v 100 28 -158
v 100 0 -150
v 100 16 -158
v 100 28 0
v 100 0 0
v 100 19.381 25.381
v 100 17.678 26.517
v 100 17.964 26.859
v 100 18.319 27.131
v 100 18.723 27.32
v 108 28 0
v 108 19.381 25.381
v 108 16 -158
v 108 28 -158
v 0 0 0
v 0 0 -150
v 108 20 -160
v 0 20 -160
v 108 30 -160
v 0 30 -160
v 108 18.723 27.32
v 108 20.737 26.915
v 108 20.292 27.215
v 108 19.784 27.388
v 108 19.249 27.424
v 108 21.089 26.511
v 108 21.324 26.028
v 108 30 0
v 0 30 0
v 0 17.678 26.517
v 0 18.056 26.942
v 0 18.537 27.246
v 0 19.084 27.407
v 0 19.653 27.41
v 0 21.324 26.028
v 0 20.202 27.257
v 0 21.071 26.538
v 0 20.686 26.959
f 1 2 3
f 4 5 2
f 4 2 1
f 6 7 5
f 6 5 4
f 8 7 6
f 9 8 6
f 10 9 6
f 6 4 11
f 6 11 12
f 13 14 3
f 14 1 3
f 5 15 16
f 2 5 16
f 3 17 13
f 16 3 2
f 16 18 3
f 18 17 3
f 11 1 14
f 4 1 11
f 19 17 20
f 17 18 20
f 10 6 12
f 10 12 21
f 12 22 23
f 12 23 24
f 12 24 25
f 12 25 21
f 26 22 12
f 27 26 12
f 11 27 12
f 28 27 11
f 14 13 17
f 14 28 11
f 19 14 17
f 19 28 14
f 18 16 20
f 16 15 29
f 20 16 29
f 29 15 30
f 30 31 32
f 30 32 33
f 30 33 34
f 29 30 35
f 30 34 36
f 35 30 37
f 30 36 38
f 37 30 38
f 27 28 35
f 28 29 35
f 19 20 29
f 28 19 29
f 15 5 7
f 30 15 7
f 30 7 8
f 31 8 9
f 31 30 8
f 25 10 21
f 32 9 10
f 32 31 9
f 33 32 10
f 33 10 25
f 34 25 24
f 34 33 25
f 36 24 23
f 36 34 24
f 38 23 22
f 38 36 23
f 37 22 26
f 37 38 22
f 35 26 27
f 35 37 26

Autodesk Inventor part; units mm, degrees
ref_plane "YZ Plane" through (0, 0, 0) normal (1, 0, 0) x (0, 1, 0)
ref_plane "XZ Plane" through (0, 0, 0) normal (0, 1, 0) x (-1, 0, 0)
ref_plane "XY Plane" through (0, 0, 0) normal (0, 0, 1) x (1, 0, 0)
sketch "Sketch1" plane through (0, 0, 0) normal (1, 0, 0) x (0, 1, 0)
  line L0 (0, 0) -> (0, -150)
  line L1 (20, -160) -> (0, -150)
  line L2 (30, 0) -> (21.3239, 26.0284)
  arc A0 (21.3239, 26.0284) -> (17.6778, 26.5166) centre (19.3814, 25.3809) ccw
  line L3 (0, 0) -> (17.6778, 26.5166)
  line L4 (20, -160) -> (30, -160)
  line L5 (30, -160) -> (30, 0)
  dimension "d0" = 150
  dimension "d4" = 30
extrude "Extrusion1" add sketch "Sketch1" along normal blind 100
sketch "Sketch2" plane through (100, 0, 0) normal (1, 0, 0) x (0, 0, -1)
  line L0 (0, 30) -> (160, 30)
  line L1 (160, 30) -> (160, 20)
  line L2 (0, 30) -> (-26.0284, 21.3239)
  line L3 (0, 30) -> (-26.0284, 21.3239) projected
  arc A0 (-26.0284, 21.3239) -> (-26.5166, 17.6778) centre (-25.3809, 19.3814) ccw projected
  arc A1 (-26.0284, 21.3239) -> (-27.3197, 18.7231) centre (-25.3809, 19.3814) ccw
  line L4 (160, 20) -> (160, 30) projected
  line L5 (158, 28) -> (0, 28)
  line L6 (0, 28) -> (-25.3809, 19.3814)
  line L7 (-25.3809, 19.3814) -> (-27.4284, 18.6861)
  line L8 (158, 28) -> (158, 16)
  line L9 (150, 0) -> (160, 20) projected
  line L10 (160, 20) -> (158, 16)
  point P0 (0, 0)
  dimension "d7" = 2
extrude "Extrusion2" add sketch "Sketch2" along normal blind 8
sketch "Sketch3" plane through (0, 30, 0) normal (0, 1, 0) x (1, 0, 0)
  point P0 (0, 0)
properties part number "Tank body"
